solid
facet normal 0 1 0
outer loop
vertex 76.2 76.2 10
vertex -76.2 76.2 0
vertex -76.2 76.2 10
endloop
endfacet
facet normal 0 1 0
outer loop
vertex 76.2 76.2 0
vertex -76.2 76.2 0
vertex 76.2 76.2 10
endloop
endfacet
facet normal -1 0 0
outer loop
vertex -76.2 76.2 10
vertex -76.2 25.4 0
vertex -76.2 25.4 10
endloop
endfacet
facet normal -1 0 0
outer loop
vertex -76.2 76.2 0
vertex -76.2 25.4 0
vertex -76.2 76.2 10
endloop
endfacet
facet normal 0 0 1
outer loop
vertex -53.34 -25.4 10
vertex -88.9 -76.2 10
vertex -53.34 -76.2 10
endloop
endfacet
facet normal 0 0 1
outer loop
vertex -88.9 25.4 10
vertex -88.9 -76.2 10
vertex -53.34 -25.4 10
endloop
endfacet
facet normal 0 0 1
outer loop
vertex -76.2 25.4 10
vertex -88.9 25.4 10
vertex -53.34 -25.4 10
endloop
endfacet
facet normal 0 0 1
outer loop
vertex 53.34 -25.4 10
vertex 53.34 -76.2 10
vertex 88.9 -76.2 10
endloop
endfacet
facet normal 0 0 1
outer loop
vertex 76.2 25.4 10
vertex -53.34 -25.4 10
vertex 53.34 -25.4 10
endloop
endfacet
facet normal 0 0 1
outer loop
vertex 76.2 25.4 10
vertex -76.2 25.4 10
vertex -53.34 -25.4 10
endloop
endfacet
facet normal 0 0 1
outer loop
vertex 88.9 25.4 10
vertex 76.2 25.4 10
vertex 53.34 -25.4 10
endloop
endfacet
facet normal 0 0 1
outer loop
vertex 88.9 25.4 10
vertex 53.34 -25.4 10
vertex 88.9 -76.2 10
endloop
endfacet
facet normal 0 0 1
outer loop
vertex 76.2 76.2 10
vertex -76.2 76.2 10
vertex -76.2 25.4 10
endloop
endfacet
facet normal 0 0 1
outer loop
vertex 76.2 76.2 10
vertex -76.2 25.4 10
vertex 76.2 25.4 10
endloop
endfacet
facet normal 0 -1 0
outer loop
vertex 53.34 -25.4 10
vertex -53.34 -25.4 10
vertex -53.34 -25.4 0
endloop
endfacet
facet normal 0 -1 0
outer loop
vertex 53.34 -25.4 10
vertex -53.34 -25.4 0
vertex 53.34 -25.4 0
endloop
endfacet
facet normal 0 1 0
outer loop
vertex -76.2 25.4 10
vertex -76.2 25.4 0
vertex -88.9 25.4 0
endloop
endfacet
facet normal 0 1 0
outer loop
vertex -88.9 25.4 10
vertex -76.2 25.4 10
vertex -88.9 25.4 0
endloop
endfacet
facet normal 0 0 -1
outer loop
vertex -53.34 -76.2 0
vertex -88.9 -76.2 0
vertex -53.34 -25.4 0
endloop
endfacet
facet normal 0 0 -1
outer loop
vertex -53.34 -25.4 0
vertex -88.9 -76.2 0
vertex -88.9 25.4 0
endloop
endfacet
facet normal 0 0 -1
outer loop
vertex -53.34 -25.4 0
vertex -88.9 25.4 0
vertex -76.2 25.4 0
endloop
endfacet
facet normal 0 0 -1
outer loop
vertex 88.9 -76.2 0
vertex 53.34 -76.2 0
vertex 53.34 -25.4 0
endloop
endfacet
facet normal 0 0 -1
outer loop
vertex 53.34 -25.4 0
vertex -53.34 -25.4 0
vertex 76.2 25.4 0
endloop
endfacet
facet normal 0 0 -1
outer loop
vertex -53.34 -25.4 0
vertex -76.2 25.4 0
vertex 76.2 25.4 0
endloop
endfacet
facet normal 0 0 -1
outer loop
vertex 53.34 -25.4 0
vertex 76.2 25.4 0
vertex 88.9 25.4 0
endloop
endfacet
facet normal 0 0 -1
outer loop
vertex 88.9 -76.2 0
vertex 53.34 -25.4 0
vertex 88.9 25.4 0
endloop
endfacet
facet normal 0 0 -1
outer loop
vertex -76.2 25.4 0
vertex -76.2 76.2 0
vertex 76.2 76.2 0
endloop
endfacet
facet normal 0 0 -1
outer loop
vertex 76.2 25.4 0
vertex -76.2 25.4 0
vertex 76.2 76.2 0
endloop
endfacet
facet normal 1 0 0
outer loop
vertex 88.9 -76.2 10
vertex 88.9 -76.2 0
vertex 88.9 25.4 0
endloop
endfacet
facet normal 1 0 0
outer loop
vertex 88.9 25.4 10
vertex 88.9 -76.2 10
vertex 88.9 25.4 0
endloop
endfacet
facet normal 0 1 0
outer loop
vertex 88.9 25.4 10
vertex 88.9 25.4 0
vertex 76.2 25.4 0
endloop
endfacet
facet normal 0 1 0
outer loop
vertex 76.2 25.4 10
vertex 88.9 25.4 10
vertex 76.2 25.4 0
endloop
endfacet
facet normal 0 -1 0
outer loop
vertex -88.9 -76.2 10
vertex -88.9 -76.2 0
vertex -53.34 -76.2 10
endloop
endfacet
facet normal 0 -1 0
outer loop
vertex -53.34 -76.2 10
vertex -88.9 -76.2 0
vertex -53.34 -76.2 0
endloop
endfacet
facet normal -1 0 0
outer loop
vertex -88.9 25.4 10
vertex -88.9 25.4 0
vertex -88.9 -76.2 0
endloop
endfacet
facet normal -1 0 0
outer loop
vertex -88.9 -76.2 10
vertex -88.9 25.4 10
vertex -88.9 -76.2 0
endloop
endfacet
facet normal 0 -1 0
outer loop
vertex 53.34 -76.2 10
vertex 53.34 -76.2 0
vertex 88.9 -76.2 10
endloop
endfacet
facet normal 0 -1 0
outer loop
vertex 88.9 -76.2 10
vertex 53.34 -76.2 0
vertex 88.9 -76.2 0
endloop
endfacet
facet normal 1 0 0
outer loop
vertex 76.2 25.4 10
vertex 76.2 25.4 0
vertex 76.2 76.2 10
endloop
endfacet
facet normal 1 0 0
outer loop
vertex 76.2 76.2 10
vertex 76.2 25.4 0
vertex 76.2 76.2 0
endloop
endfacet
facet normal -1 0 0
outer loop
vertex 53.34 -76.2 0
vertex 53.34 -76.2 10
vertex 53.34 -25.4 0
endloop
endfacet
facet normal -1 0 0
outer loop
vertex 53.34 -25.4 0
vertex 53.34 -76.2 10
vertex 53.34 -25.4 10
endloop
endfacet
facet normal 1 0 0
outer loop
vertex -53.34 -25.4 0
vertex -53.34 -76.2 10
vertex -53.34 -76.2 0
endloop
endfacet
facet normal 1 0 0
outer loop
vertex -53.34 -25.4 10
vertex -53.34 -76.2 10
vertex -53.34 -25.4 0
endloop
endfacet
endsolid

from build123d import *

# Parameters (mm, degrees)
F0_W     = 152.4
F0_H     = 25.4
F0_H_2   = 50.8
F1_DEPTH = 10
F2_W     = 106.68
F2_H     = 50.8
F3_DEPTH = 25.4


with BuildPart() as f1:
    # F0 (on Top) → F1 (new body)
    with BuildSketch(Plane.XY):
        Polygon((88.9, -76.2), (88.9, 25.4), (76.2, 25.4), (76.2, 0), (-76.2, 0), (-76.2, 25.4), (-88.9, 25.4), (-88.9, -76.2), align=None)
        with Locations((0, 12.7)):
            Rectangle(F0_W, F0_H)
        with Locations((0, 50.8)):
            Rectangle(F0_W, F0_H_2)
    extrude(amount=F1_DEPTH)

    # F2 (on face) → F3 (cut)
    with BuildSketch(Plane.XY.offset(10)):
        with Locations((0, -50.8)):
            Rectangle(F2_W, F2_H)
    extrude(amount=-F3_DEPTH, mode=Mode.SUBTRACT)


solid = f1.part
